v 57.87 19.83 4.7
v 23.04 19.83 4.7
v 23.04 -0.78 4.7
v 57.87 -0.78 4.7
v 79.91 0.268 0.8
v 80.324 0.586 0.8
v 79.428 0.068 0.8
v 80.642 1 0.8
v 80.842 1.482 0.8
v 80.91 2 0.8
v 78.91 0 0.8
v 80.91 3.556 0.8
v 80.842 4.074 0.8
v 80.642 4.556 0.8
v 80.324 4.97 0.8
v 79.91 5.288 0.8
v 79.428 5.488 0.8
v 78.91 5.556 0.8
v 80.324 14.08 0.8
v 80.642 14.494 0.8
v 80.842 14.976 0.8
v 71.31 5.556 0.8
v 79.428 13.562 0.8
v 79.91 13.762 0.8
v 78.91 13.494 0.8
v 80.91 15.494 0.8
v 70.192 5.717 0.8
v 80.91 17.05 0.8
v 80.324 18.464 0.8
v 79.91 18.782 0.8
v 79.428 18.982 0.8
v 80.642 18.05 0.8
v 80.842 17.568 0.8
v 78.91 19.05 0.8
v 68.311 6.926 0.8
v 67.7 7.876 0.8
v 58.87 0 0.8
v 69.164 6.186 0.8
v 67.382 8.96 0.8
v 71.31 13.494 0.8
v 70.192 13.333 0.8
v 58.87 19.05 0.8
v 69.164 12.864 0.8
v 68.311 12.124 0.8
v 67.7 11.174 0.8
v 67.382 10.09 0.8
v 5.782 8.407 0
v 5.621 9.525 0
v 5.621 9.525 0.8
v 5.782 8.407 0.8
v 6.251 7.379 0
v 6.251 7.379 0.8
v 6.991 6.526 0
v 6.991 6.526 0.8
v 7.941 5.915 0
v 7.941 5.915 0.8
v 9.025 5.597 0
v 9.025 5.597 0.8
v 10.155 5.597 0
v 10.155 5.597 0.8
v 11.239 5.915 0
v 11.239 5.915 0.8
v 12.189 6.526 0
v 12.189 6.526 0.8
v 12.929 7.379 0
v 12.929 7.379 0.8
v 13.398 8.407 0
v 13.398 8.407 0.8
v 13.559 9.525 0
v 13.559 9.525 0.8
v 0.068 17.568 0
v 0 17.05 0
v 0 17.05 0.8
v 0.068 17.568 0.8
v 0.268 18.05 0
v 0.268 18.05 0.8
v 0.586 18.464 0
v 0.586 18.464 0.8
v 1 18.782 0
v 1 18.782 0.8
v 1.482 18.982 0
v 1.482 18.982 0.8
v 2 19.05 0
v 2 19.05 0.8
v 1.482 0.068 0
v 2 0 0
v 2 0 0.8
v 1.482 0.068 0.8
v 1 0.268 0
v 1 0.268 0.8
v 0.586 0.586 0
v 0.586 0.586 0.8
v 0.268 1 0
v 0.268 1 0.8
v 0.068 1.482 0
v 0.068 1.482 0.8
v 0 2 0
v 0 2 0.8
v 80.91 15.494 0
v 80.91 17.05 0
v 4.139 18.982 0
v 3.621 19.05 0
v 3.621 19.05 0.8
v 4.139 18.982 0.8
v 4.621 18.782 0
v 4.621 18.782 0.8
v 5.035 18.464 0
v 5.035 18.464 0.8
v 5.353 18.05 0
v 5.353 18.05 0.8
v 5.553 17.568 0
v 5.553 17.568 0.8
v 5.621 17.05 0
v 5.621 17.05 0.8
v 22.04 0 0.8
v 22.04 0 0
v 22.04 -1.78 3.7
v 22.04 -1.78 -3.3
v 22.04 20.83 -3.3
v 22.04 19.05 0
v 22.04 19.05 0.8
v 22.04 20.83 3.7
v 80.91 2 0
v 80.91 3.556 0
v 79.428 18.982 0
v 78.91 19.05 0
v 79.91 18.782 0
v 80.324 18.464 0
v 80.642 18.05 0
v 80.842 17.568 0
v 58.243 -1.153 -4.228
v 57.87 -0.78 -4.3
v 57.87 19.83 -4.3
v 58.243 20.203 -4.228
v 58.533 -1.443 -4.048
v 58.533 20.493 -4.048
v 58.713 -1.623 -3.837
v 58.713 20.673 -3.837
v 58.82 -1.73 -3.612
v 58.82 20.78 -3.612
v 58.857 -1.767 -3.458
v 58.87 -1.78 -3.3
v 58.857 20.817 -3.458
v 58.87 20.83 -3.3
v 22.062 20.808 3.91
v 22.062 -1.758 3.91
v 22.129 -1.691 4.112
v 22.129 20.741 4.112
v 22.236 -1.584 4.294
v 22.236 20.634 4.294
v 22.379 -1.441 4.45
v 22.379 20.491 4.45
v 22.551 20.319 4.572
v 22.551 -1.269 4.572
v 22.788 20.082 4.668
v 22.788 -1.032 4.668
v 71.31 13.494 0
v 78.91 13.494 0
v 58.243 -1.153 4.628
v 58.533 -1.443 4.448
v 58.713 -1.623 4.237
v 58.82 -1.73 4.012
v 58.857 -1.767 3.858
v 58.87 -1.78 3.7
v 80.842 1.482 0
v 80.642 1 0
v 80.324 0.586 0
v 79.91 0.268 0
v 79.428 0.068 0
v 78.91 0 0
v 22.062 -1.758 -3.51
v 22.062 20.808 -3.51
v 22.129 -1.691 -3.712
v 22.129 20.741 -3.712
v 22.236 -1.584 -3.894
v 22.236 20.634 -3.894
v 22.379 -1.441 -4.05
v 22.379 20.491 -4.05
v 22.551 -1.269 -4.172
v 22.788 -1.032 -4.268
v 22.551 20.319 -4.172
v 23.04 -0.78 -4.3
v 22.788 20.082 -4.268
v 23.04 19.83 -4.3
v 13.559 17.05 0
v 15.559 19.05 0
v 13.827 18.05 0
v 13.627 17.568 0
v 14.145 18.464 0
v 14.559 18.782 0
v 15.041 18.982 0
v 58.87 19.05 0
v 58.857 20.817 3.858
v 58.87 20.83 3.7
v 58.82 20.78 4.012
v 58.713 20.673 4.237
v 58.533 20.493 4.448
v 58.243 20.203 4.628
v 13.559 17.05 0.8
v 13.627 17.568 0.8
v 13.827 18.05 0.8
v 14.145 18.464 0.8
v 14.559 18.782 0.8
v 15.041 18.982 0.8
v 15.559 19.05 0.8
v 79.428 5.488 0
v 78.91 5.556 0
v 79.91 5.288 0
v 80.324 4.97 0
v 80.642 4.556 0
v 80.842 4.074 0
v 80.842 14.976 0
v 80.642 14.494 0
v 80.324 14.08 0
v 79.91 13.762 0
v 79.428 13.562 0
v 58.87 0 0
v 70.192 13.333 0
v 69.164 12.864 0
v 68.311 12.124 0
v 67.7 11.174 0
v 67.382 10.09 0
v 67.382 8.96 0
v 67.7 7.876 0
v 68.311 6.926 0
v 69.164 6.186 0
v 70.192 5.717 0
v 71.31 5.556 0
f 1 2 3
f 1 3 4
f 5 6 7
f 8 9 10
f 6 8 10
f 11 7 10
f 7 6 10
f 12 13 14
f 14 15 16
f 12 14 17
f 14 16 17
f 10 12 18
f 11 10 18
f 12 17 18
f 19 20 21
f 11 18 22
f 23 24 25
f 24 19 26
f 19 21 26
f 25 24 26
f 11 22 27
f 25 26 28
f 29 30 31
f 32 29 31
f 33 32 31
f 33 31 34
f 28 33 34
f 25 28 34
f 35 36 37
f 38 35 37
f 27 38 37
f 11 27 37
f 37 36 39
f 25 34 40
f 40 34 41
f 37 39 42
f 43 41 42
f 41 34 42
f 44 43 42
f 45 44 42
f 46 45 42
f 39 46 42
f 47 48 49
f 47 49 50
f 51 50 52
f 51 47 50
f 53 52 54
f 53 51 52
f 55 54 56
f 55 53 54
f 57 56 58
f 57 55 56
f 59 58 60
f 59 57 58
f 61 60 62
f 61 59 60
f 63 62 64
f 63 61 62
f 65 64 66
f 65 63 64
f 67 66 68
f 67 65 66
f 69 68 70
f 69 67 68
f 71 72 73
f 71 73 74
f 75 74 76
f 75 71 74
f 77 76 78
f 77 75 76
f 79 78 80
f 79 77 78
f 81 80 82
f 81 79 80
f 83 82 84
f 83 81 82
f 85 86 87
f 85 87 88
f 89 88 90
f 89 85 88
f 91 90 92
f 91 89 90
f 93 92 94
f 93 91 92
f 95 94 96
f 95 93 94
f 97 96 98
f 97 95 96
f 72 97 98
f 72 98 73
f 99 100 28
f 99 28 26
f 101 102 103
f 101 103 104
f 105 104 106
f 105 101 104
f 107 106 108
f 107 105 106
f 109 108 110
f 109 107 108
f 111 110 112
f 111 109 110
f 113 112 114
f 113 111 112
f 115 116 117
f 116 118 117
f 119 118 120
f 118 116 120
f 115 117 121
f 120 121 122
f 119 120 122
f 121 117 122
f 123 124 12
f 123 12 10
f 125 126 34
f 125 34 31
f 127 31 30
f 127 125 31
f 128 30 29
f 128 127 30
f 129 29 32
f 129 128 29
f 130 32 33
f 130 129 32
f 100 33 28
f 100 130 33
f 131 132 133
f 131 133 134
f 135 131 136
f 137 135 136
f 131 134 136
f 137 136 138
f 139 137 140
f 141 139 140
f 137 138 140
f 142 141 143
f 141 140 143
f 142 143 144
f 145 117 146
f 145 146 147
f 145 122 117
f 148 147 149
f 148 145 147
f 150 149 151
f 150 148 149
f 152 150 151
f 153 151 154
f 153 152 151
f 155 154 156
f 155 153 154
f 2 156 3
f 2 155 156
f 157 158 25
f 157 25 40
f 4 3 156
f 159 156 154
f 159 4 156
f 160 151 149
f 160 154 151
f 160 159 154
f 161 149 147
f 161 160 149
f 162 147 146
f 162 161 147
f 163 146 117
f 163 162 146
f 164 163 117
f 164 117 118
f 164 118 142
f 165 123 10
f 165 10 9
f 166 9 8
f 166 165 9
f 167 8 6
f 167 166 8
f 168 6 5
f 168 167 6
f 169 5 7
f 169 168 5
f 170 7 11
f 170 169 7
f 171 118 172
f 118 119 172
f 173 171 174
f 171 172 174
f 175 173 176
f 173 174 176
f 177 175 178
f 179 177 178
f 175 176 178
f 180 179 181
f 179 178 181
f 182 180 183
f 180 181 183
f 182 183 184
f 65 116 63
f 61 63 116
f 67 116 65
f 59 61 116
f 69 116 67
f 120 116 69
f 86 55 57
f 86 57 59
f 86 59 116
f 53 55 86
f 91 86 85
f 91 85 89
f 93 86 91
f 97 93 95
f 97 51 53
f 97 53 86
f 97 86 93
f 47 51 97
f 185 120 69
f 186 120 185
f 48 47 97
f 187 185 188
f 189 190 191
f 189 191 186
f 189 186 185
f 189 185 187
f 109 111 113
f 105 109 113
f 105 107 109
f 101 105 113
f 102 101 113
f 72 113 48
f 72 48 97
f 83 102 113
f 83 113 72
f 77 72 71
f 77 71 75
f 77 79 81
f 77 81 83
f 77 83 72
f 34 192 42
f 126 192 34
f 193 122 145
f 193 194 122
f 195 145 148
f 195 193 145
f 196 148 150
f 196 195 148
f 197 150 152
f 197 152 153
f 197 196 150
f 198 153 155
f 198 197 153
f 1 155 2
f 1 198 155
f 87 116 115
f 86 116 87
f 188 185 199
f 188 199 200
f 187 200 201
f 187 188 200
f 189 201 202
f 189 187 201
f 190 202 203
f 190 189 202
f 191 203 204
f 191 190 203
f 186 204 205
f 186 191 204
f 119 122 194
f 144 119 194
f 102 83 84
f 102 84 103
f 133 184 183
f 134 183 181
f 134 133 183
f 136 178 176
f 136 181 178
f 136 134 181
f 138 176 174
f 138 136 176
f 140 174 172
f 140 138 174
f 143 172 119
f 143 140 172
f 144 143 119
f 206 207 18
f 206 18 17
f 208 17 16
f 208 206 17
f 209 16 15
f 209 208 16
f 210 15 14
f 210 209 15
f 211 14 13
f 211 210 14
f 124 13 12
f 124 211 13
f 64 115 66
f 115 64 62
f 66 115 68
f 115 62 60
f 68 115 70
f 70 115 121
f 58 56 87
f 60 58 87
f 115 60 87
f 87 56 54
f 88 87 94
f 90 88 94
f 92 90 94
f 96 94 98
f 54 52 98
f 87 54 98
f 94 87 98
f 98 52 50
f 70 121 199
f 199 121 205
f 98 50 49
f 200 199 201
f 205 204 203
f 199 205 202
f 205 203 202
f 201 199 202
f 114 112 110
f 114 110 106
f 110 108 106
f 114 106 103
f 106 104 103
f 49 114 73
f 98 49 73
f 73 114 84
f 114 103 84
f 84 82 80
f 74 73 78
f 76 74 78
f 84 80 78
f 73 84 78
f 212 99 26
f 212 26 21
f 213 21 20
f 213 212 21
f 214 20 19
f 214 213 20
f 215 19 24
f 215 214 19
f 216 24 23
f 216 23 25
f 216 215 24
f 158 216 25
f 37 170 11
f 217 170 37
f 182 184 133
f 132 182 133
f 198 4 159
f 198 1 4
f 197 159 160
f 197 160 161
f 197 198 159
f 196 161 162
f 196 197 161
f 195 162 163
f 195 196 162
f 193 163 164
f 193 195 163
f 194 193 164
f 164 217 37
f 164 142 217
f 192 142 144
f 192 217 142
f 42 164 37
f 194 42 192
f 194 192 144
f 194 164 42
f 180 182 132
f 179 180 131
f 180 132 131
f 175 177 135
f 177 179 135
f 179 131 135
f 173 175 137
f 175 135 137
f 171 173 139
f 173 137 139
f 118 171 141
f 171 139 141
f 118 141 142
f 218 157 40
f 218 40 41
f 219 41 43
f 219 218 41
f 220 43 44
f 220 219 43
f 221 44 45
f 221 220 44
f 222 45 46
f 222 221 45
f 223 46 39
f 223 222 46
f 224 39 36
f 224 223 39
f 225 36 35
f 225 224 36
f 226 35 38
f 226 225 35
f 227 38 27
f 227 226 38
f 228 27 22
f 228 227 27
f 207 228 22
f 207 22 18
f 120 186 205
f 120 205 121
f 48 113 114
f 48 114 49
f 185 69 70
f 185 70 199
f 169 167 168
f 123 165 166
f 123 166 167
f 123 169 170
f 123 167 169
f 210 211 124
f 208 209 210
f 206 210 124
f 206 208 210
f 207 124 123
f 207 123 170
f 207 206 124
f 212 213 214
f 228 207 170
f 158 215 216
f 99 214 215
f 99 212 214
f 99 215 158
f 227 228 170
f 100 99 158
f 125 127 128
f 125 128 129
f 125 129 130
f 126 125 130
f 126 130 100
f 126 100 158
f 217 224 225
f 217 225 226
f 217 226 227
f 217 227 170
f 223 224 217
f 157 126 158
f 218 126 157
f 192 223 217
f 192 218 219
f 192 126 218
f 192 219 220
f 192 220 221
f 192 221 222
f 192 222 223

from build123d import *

# Parameters (mm, degrees)
SALIENTE_EXTRUIR1_DEPTH      = 0.8
CROQUIS2_W                   = 36.83
CROQUIS2_H                   = 22.61
SALIENTE_EXTRUIR2_DEPTH      = 3.9
SALIENTE_EXTRUIR2_DEPTH_BACK = 5.1
REDONDEO1_R                  = 1
REDONDEO2_R                  = 1


with BuildPart() as part:
    # Croquis1 → Saliente-Extruir1 (new body)
    with BuildSketch(Plane.XY):
        with BuildLine():
            Line((0, 2), (0, 17.05))
            ThreePointArc((0, 17.05), (0.585786438, 18.464213562), (2, 19.05))
            Line((2, 19.05), (3.62125, 19.05))
            ThreePointArc((3.62125, 19.05), (5.035463562, 18.464213562), (5.62125, 17.05))
            Line((5.62125, 17.05), (5.62125, 9.525))
            ThreePointArc((5.62125, 9.525), (9.59, 5.55625), (13.55875, 9.525))
            Line((13.55875, 9.525), (13.55875, 17.05))
            ThreePointArc((13.55875, 17.05), (14.144536438, 18.464213562), (15.55875, 19.05))
            Line((15.55875, 19.05), (78.91, 19.05))
            ThreePointArc((78.91, 19.05), (80.324213562, 18.464213562), (80.91, 17.05))
            Line((80.91, 17.05), (80.91, 15.49375))
            ThreePointArc((80.91, 15.49375), (80.324213562, 14.079536438), (78.91, 13.49375))
            Line((78.91, 13.49375), (71.31, 13.49375))
            ThreePointArc((71.31, 13.49375), (67.34125, 9.525), (71.31, 5.55625))
            Line((71.31, 5.55625), (78.91, 5.55625))
            ThreePointArc((78.91, 5.55625), (80.324213562, 4.970463562), (80.91, 3.55625))
            Line((80.91, 3.55625), (80.91, 2))
            ThreePointArc((80.91, 2), (80.324213562, 0.585786438), (78.91, 0))
            Line((78.91, 0), (2, 0))
            ThreePointArc((2, 0), (0.585786438, 0.585786438), (0, 2))
        make_face()
    extrude(amount=SALIENTE_EXTRUIR1_DEPTH)

    # Croquis2 → Saliente-Extruir2 (add, two sides)
    with BuildSketch(Plane.XY.offset(0.8)) as saliente_extruir2_sk:
        with Locations((40.455, 9.525)):
            Rectangle(CROQUIS2_W, CROQUIS2_H)
    extrude(amount=SALIENTE_EXTRUIR2_DEPTH)
    extrude(saliente_extruir2_sk.sketch, amount=-SALIENTE_EXTRUIR2_DEPTH_BACK)

    # Redondeo1
    redondeo1_edges = [part.edges().sort_by_distance(p)[0] for p in [
        (22.04, 9.525, -4.3),
        (58.87, 9.525, -4.3),
        (40.455, 20.83, -4.3),
        (40.455, -1.78, -4.3),
    ]]
    fillet(redondeo1_edges, radius=REDONDEO1_R)

    # Redondeo2
    redondeo2_edges = [part.edges().sort_by_distance(p)[0] for p in [
        (22.04, 9.525, 4.7),
        (40.455, -1.78, 4.7),
        (58.87, 9.525, 4.7),
        (40.455, 20.83, 4.7),
    ]]
    fillet(redondeo2_edges, radius=REDONDEO2_R)


solid = part.part
